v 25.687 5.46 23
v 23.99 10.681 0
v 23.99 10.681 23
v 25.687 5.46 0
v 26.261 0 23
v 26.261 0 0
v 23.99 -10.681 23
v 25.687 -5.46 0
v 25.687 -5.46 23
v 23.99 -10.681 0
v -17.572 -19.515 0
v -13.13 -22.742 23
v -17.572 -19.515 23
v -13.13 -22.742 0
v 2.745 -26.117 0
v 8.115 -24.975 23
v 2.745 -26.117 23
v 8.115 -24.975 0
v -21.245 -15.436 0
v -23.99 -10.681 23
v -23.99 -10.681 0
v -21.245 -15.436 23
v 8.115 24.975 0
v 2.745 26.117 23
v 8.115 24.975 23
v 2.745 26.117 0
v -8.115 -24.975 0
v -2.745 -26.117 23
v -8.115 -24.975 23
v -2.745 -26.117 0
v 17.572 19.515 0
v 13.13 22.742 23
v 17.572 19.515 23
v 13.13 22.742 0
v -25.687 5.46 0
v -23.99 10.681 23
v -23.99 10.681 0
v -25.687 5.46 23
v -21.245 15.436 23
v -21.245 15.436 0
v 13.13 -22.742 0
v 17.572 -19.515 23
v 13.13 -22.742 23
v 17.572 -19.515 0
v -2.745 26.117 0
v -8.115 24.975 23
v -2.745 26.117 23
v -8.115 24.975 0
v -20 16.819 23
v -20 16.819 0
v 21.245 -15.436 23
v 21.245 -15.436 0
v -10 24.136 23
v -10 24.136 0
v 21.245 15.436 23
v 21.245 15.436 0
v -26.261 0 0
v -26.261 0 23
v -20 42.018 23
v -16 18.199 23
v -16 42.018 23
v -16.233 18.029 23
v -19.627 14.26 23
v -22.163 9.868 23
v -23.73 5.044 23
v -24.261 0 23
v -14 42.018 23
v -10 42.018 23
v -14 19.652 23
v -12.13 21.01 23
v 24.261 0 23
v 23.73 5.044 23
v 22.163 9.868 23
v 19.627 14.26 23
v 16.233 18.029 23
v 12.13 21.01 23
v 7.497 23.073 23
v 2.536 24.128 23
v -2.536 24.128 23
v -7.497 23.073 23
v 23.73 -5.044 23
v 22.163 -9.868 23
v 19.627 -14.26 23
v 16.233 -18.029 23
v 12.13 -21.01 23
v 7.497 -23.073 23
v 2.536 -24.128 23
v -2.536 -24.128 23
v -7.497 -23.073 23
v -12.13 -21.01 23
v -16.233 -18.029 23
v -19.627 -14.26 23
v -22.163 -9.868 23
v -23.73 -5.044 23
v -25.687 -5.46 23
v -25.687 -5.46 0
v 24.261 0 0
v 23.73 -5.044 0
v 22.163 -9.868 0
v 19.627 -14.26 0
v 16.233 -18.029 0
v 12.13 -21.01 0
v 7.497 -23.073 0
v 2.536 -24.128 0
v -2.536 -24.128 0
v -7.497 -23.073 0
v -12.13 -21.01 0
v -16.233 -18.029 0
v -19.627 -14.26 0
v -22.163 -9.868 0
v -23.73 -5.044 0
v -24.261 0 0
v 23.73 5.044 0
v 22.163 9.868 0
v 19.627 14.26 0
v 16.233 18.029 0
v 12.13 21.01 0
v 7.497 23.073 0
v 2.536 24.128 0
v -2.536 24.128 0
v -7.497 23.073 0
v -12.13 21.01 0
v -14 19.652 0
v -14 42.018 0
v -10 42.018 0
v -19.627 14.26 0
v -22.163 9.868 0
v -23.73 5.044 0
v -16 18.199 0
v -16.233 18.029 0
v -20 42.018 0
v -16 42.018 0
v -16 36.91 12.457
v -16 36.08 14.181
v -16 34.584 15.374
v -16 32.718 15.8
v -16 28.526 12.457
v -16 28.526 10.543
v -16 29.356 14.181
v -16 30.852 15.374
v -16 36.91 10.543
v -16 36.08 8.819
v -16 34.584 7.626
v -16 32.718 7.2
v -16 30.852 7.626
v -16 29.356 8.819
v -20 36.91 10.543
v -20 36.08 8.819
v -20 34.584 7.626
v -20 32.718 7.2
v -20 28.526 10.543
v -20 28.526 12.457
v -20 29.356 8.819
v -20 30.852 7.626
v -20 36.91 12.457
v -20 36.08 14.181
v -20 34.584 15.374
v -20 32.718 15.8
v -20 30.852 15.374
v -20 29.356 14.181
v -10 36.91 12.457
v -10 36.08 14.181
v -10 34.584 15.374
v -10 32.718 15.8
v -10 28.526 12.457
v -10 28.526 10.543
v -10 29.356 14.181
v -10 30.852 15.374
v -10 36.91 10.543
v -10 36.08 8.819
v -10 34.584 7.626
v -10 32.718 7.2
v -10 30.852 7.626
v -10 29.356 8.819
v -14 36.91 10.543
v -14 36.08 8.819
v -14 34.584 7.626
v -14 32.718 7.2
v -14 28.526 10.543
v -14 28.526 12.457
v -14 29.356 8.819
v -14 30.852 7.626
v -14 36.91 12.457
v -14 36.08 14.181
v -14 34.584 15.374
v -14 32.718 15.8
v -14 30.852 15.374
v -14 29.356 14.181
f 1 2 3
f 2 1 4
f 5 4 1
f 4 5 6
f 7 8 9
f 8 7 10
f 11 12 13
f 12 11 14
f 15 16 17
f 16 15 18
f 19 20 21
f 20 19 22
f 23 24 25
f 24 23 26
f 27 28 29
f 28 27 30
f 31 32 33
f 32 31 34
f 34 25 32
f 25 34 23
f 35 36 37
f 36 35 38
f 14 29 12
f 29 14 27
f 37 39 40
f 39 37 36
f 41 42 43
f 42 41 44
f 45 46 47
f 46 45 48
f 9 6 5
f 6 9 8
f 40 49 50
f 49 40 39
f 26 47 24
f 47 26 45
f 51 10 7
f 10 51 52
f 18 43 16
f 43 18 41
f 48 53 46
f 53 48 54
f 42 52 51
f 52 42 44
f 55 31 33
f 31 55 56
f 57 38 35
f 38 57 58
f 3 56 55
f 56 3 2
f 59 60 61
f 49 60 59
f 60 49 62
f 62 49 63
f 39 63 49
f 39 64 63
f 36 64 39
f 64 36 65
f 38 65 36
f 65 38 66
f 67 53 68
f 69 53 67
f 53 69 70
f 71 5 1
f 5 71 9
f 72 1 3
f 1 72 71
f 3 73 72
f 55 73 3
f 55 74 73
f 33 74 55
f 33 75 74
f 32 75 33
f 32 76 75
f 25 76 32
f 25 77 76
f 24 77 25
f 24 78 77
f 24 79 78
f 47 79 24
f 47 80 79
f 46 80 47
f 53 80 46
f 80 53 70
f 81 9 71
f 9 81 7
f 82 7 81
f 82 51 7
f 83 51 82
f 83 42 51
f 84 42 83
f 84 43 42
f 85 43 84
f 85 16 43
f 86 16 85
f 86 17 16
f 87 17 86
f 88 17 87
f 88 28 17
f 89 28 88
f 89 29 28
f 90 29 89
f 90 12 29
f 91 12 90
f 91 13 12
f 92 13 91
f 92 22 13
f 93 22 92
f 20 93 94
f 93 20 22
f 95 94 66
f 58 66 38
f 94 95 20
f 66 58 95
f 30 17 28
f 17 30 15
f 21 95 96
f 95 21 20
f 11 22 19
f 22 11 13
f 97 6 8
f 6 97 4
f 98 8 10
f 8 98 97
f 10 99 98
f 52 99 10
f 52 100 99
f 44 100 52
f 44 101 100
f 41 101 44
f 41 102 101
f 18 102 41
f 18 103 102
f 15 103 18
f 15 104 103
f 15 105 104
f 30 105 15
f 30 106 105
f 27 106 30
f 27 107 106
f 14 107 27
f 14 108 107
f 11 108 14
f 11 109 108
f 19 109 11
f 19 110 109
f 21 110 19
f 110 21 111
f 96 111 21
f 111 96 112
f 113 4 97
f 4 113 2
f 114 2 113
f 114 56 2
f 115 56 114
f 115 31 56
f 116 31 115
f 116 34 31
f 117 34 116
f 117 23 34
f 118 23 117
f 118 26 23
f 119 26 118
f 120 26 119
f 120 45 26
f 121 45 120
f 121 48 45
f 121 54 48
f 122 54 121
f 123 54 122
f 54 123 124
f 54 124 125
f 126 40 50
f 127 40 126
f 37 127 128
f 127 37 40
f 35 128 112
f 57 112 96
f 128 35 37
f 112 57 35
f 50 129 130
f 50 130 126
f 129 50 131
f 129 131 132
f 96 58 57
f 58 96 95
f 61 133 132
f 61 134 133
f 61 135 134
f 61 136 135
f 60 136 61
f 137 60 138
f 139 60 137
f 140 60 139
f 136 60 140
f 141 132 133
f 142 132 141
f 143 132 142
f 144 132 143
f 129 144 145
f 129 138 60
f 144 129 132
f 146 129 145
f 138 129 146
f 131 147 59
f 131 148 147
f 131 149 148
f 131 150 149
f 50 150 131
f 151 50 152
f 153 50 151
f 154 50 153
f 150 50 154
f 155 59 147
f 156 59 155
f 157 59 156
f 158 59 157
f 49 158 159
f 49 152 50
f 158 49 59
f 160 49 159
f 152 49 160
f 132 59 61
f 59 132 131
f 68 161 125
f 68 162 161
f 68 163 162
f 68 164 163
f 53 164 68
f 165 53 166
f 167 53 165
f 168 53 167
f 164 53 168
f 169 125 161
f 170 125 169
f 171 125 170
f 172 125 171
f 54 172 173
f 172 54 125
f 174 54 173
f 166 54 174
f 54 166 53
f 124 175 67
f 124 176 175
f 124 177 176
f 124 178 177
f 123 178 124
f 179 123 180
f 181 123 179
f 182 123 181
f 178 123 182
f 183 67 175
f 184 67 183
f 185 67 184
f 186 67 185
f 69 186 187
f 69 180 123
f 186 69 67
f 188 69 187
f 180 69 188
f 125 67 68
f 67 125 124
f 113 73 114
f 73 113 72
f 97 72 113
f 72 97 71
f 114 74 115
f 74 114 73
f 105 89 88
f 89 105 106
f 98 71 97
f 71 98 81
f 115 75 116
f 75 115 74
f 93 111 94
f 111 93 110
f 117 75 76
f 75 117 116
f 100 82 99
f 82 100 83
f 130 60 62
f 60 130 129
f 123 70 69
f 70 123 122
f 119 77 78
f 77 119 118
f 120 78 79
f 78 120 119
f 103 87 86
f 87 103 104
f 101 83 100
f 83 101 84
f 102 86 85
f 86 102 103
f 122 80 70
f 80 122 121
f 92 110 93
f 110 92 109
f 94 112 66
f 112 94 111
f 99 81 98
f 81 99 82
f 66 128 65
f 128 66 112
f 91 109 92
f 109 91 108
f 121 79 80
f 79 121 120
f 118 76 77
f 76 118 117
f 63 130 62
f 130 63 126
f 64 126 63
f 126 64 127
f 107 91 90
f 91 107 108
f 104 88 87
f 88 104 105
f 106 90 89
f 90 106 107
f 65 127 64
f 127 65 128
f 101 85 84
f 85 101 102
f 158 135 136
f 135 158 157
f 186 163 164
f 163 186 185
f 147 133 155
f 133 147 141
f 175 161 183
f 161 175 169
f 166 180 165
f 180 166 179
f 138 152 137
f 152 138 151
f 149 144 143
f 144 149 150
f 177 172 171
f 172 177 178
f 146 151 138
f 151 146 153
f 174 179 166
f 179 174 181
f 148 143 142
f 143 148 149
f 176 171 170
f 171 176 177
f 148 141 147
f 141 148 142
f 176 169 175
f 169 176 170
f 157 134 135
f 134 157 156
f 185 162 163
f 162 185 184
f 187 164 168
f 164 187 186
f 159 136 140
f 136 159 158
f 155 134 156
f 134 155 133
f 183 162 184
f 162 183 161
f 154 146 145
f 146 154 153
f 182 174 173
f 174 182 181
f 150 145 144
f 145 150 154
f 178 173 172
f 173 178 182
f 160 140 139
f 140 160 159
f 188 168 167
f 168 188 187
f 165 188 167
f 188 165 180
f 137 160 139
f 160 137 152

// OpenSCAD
// Copyright 2019 Marcos Del Sol Vives
// SPDX-License-Identifier: ISC

inner_radius = 165 / PI / 2 - 2;

outer_radius = inner_radius + 2;

ring_height = 23;

tab_to_center = 20;

tab_thickness = 4;

tab_spacing = 2;

tab_length = 25;

tab_alpha = asin(tab_to_center / outer_radius);
tab_y = outer_radius * cos(tab_alpha);

screw_diameter = 4.3;
screw_margin = 5;

difference() {
	union() {
		cylinder(r=outer_radius, h=ring_height);

		translate([-tab_to_center, 0, 0]) {
			cube([tab_thickness, tab_y + tab_length, ring_height]);
		}

		translate([-tab_to_center + tab_spacing + tab_thickness, 0, 0]) {
			cube([tab_thickness, tab_y + tab_length, ring_height]);
		}
	}

	cylinder(r = inner_radius, h = ring_height);
	translate([-tab_to_center + tab_thickness, 0, 0]) {
		cube([tab_spacing, tab_y + tab_length, ring_height]);
	}

	translate([-tab_to_center, tab_y + tab_length - screw_diameter - screw_margin, ring_height / 2])
		rotate([0, 90, 0])
			cylinder(r = screw_diameter, h=tab_spacing + tab_thickness * 2);
}
